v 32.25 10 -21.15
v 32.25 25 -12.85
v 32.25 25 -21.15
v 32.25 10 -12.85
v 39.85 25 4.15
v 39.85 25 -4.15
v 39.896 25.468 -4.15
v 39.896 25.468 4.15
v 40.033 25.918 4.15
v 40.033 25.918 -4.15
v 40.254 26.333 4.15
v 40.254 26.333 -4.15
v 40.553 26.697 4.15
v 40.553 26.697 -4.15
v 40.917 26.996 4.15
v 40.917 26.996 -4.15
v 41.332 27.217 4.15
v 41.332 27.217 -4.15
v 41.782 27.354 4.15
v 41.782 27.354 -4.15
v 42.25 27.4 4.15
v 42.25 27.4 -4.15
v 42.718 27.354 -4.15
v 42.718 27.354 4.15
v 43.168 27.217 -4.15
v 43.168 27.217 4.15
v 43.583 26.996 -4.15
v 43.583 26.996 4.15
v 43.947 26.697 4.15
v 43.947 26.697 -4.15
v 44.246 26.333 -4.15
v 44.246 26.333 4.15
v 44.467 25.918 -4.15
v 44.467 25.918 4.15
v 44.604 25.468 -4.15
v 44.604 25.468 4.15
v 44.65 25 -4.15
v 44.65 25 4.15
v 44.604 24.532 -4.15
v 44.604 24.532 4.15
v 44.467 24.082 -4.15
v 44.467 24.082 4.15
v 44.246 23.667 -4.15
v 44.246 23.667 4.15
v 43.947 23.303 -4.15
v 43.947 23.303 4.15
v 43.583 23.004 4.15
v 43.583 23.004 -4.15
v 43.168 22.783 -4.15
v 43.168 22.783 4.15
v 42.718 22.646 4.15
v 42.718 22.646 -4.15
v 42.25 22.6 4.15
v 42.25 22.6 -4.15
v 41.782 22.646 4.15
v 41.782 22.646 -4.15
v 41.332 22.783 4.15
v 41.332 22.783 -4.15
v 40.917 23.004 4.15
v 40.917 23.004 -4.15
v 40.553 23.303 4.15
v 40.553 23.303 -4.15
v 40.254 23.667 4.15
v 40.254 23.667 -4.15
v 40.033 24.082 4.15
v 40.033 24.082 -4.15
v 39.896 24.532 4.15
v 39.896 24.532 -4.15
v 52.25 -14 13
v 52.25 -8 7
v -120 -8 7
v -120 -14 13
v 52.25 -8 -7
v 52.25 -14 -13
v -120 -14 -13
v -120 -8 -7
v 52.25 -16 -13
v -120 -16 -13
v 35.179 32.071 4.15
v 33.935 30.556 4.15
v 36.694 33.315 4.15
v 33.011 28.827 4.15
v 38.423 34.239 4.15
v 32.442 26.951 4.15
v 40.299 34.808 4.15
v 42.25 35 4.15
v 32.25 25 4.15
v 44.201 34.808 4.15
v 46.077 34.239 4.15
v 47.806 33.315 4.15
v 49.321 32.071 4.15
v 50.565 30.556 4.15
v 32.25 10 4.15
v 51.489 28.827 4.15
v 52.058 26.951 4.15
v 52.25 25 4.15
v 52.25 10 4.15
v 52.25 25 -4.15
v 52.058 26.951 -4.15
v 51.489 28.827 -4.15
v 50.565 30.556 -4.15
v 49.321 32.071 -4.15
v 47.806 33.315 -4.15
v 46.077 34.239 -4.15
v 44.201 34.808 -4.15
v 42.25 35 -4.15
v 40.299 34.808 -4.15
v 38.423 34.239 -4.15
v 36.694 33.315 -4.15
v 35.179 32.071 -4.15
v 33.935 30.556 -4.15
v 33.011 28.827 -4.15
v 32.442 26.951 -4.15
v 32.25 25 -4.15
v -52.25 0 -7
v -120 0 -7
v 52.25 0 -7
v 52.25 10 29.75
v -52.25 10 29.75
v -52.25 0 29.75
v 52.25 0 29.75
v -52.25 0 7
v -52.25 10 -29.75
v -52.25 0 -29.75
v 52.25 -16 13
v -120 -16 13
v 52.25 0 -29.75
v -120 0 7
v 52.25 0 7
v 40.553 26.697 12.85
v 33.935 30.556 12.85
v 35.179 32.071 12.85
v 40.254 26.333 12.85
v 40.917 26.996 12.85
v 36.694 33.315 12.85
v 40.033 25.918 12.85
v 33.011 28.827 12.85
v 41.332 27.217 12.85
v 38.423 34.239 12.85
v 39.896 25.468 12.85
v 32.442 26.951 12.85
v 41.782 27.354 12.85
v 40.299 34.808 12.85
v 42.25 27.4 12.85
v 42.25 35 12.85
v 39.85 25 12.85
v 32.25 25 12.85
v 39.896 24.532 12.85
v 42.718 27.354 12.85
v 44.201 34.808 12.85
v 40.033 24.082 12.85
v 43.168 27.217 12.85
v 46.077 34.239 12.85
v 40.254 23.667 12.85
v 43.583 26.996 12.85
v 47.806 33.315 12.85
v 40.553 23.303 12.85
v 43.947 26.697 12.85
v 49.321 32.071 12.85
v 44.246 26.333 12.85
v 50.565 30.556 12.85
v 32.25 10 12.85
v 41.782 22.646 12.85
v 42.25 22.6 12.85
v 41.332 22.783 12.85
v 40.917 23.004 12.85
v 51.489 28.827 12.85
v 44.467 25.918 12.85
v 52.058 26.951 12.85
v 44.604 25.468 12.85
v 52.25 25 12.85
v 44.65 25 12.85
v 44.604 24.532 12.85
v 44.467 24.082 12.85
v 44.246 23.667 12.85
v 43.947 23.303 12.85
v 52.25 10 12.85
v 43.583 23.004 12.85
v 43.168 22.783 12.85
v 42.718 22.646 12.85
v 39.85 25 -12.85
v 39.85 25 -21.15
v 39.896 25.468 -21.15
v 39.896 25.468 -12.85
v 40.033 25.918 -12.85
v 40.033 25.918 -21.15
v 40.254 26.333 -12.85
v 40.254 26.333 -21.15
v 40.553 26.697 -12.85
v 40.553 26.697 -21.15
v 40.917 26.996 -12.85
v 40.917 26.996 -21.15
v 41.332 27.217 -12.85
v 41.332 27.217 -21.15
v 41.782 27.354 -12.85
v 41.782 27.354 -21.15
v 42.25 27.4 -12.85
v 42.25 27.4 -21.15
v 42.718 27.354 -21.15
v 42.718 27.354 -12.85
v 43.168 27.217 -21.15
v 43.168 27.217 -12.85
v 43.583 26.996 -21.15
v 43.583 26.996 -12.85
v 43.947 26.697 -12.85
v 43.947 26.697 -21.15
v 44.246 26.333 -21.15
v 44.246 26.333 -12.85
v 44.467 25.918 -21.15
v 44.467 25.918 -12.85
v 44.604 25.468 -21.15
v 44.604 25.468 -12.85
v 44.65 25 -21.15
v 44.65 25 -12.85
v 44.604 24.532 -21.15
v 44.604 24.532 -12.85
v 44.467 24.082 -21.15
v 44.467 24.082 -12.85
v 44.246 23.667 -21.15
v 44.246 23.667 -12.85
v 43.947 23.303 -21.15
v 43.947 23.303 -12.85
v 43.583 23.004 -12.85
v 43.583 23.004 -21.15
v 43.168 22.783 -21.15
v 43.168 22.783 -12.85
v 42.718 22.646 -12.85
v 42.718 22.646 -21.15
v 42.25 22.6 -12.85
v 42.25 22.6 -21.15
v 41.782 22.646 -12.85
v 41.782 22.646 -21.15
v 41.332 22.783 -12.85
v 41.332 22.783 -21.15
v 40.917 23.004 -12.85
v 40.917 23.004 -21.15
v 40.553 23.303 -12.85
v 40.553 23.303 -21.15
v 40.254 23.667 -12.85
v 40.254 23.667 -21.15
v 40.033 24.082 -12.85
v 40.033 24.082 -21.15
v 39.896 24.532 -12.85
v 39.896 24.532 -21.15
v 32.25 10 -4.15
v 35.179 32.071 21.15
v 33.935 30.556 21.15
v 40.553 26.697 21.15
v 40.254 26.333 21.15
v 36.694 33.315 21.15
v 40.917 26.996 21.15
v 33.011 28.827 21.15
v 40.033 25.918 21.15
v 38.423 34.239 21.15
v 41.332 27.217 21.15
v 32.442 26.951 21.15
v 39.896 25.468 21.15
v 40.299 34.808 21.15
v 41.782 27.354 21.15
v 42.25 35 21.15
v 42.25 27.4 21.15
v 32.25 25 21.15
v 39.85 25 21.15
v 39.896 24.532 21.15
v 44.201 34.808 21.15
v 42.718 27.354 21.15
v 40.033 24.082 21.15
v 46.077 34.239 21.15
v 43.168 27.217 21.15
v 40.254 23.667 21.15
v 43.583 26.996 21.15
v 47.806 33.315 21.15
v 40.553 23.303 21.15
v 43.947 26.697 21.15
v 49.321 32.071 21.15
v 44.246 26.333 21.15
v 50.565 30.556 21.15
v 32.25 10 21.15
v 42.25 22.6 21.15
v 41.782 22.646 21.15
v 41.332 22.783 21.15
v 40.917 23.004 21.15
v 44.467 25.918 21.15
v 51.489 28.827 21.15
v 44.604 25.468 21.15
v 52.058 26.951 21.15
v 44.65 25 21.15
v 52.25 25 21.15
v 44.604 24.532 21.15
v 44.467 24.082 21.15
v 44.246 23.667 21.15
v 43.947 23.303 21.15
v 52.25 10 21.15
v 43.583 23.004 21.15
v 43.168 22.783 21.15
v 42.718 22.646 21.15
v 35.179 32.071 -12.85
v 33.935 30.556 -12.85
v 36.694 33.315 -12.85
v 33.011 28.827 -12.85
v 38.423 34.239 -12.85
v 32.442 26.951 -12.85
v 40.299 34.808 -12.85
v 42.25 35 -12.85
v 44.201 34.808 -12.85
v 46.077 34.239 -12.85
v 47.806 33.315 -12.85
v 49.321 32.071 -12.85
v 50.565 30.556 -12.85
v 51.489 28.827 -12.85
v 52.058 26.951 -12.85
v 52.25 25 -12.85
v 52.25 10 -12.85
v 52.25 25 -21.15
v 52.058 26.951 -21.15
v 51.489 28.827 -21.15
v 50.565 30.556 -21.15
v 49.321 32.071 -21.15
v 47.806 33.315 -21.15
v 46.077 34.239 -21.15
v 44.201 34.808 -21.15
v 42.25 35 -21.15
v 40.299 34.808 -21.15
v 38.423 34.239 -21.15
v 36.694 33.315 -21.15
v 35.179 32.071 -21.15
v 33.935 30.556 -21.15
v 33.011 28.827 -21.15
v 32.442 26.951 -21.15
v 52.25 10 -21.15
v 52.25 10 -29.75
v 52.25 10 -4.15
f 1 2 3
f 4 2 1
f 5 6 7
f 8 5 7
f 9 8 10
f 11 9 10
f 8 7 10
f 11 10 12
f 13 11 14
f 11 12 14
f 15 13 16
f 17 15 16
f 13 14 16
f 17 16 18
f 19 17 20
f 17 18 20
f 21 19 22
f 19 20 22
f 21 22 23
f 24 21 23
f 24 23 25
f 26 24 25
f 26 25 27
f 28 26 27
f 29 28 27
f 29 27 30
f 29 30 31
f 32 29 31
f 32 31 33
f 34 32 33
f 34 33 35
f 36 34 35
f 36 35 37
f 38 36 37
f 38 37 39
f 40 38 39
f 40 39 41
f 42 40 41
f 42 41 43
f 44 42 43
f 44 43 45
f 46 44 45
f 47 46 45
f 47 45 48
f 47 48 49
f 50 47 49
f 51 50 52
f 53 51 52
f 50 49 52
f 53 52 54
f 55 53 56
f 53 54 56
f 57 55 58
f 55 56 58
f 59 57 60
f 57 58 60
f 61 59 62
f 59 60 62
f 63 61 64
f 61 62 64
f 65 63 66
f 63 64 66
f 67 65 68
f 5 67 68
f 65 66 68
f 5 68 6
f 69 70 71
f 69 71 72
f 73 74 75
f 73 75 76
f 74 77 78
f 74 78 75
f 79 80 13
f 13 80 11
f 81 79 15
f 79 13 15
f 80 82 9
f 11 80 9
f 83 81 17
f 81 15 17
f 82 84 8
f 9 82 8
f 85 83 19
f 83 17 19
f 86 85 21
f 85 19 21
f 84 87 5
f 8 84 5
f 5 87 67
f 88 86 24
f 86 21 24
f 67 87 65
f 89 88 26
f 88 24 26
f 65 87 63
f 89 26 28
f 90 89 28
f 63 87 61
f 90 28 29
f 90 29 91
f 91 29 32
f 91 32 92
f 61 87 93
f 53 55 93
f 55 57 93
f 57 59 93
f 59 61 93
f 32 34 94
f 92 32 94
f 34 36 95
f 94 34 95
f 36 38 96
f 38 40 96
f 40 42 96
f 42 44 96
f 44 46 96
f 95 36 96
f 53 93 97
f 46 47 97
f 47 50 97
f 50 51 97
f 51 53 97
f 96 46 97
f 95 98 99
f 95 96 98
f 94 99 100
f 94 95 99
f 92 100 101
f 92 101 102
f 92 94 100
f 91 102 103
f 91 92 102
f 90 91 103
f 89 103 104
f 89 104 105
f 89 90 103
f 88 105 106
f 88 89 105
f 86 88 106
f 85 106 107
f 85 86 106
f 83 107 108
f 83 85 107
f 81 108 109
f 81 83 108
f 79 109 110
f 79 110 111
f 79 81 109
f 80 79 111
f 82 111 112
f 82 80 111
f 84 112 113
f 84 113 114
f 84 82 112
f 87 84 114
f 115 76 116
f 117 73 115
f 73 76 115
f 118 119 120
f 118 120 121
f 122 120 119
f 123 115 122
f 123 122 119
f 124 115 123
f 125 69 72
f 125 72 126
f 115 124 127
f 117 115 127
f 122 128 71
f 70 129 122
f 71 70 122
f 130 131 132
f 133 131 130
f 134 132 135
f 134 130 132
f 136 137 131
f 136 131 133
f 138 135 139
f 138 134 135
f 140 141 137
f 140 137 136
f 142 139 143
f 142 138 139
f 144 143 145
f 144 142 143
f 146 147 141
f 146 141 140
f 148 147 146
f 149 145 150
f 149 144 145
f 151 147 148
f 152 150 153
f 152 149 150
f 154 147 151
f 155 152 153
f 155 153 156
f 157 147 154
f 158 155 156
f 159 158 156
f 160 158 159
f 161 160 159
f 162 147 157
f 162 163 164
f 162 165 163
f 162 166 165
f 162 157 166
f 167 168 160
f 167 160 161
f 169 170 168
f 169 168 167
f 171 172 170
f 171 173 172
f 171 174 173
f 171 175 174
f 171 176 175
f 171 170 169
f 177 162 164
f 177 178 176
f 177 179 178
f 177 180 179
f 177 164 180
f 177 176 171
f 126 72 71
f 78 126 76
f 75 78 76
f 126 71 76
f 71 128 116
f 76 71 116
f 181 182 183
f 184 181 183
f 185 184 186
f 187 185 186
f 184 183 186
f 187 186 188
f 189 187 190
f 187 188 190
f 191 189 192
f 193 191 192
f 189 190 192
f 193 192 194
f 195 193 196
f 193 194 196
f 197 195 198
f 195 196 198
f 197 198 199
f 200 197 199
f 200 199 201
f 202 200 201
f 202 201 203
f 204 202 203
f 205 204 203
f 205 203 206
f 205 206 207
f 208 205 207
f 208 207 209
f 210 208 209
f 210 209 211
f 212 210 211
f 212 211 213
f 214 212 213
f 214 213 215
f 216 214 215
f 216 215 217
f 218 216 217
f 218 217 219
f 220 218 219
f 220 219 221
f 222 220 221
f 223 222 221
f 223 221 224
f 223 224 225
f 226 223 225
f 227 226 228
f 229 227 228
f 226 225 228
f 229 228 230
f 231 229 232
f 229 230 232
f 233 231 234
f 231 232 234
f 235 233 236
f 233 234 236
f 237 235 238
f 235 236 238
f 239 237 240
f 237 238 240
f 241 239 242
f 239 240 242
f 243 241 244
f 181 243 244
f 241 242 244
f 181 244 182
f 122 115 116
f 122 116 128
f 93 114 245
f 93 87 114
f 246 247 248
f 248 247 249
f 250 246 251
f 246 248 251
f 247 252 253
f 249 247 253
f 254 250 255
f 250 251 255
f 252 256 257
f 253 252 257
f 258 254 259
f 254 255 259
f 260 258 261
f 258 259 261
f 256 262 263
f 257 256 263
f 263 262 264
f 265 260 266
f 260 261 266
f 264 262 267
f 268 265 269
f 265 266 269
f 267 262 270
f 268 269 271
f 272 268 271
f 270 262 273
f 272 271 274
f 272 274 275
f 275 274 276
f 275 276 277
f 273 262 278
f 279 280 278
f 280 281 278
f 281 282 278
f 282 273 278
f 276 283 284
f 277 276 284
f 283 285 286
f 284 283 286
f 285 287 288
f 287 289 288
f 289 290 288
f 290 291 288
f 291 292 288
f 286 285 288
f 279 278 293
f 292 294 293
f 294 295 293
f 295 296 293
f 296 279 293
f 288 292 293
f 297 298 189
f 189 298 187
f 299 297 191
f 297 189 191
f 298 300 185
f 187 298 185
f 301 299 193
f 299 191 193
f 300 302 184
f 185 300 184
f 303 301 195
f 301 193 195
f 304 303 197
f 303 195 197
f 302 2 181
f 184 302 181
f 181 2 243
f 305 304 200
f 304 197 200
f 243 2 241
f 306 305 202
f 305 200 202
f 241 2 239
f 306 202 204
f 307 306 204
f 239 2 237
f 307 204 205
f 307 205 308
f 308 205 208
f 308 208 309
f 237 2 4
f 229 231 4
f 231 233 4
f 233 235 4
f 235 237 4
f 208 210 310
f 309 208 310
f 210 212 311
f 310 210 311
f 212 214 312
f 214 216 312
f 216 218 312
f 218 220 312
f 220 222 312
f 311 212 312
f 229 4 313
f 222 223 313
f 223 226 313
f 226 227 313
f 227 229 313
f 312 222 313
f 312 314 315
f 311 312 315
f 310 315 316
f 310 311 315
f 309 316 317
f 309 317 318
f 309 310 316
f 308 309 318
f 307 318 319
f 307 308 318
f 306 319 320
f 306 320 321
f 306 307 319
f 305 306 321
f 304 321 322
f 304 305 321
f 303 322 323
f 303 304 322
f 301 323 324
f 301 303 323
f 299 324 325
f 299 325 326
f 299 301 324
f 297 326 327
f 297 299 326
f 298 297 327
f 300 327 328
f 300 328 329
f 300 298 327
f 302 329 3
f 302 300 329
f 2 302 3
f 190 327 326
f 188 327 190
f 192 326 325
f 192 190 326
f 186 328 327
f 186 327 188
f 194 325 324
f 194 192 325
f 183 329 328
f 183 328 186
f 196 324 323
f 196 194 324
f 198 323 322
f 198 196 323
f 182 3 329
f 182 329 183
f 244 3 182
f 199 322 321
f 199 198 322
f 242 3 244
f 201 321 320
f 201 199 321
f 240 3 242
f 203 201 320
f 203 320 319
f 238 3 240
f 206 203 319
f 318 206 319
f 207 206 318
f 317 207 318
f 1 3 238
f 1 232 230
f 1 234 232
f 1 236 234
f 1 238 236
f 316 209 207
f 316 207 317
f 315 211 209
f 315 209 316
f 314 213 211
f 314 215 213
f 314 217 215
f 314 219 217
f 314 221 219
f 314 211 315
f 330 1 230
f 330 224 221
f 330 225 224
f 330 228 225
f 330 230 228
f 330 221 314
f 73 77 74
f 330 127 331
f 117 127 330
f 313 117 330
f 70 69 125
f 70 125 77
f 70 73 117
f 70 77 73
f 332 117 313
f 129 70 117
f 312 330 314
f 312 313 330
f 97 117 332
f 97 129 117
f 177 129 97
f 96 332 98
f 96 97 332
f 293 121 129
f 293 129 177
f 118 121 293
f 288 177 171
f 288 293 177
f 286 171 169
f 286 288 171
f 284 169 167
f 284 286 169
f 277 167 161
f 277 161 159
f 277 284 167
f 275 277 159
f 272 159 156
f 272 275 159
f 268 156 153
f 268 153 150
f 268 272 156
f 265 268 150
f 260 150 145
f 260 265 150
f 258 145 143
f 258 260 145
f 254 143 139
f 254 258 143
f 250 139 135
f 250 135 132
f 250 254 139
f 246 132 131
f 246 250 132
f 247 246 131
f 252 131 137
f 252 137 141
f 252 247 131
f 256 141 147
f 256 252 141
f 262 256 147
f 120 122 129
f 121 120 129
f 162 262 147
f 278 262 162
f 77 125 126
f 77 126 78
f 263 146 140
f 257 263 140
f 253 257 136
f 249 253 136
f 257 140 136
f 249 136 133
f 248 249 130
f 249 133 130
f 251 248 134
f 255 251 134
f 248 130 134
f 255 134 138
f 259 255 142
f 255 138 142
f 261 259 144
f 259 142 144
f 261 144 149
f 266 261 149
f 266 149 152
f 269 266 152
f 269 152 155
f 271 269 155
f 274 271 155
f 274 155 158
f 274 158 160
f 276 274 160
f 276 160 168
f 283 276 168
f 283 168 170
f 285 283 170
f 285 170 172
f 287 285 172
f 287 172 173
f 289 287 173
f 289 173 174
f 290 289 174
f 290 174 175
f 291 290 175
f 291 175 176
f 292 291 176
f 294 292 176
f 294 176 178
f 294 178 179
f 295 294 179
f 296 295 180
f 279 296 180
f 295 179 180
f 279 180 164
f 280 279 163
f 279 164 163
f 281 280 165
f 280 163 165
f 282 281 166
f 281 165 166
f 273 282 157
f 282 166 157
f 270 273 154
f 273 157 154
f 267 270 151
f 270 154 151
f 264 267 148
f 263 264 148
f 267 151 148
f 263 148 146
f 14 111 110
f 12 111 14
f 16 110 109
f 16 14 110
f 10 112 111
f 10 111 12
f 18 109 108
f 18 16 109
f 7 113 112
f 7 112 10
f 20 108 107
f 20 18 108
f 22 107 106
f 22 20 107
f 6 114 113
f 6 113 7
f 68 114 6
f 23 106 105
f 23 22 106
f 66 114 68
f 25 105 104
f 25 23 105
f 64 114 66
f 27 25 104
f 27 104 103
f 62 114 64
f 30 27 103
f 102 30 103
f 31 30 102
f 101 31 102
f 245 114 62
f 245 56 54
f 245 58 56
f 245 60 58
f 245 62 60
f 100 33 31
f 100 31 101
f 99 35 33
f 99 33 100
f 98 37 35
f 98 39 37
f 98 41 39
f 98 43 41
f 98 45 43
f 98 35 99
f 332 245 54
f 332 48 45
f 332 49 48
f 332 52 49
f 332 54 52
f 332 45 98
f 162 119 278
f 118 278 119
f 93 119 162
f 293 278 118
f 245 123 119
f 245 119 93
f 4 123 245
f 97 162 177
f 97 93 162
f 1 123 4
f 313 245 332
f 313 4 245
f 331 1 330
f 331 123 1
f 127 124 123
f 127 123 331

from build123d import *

# Parameters (mm, degrees)
SKETCH1_W                       = 104.5
SKETCH1_H                       = 59.5
BOSS_EXTRUDE1_DEPTH             = 10
BOSS_EXTRUDE2_REACH             = 62.952
BOSS_EXTRUDE2_DIRECTION_2_REACH = 62.952
SKETCH4_W                       = 20
SKETCH4_H                       = 8.6
SKETCH4_H_2                     = 8.7
CUT_EXTRUDE1_DEPTH              = 66.116242213
M4_CLEARANCE_HOLE1_D            = 4.8
BOSS_EXTRUDE3_REACH             = 71.571
BOSS_EXTRUDE3_DIRECTION_2_DEPTH = 120


with BuildPart() as part:
    # Sketch1 → Boss-Extrude1 (new body)
    with BuildSketch(Plane(origin=(0, 0, 0), x_dir=(1, 0, 0), z_dir=(0, 1, 0))):
        Rectangle(SKETCH1_W, SKETCH1_H)
    extrude(amount=BOSS_EXTRUDE1_DEPTH)

    # Boss-Extrude2: up to this face of the body (flat: up to its plane)
    boss_extrude2_end = Plane(part.part.faces().sort_by_distance((0, 5, 29.75))[0])
    # Sketch3 → Boss-Extrude2 (add, up to the picked face)
    with BuildSketch(Plane.XY, mode=Mode.PRIVATE) as boss_extrude2_sk1:
        with BuildLine():
            Line((52.25, 10), (52.25, 25))
            ThreePointArc((52.25, 25), (42.25, 35), (32.25, 25))
            Line((32.25, 25), (32.25, 10))
            Line((32.25, 10), (52.25, 10))
        make_face()
    boss_extrude2_tool1 = split(extrude(boss_extrude2_sk1.sketch, amount=BOSS_EXTRUDE2_REACH, mode=Mode.PRIVATE), bisect_by=boss_extrude2_end, keep=Keep.BOTH, mode=Mode.PRIVATE)
    add(boss_extrude2_tool1.solids().sort_by(Axis((42.25, 21.535979, 0), (0, 0, 1)))[0])

    # Boss-Extrude2 direction 2: up to this face of the body (flat: up to its plane)
    boss_extrude2_direction_2_end = Plane(part.part.faces().sort_by_distance((0, 5, -29.75))[0])
    # Sketch3 → Boss-Extrude2 direction 2 (add, up to the picked face)
    with BuildSketch(Plane.XY, mode=Mode.PRIVATE) as boss_extrude2_direction_2_sk1:
        with BuildLine():
            Line((52.25, 10), (52.25, 25))
            ThreePointArc((52.25, 25), (42.25, 35), (32.25, 25))
            Line((32.25, 25), (32.25, 10))
            Line((32.25, 10), (52.25, 10))
        make_face()
    boss_extrude2_direction_2_tool1 = split(extrude(boss_extrude2_direction_2_sk1.sketch, amount=-BOSS_EXTRUDE2_DIRECTION_2_REACH, mode=Mode.PRIVATE), bisect_by=boss_extrude2_direction_2_end, keep=Keep.BOTH, mode=Mode.PRIVATE)
    add(boss_extrude2_direction_2_tool1.solids().sort_by(Axis((42.25, 21.535979, 0), (0, 0, -1)))[0])

    # Sketch4 → Cut-Extrude1 (cut, through all)
    with BuildSketch(Plane(origin=(0, 10, 0), x_dir=(1, 0, 0), z_dir=(0, 1, 0))):
        with Locations((42.25, 25.45)):
            Rectangle(SKETCH4_W, SKETCH4_H)
        with Locations((42.25, 8.5)):
            Rectangle(SKETCH4_W, SKETCH4_H_2)
        with Locations((42.25, -8.5)):
            Rectangle(SKETCH4_W, SKETCH4_H_2)
        with Locations((42.25, -25.45)):
            Rectangle(SKETCH4_W, SKETCH4_H)
    extrude(amount=CUT_EXTRUDE1_DEPTH, mode=Mode.SUBTRACT)

    # M4 Clearance Hole1 (through all)
    with Locations(Plane.XY.offset(29.75)):
        with Locations((42.25, 25)):
            Hole(M4_CLEARANCE_HOLE1_D / 2)

    # Boss-Extrude3: up to this face of the body (flat: up to its plane)
    boss_extrude3_end = Plane(part.part.faces().sort_by_distance((52.25, 9.820598864, 0))[0])
    # Sketch8 → Boss-Extrude3 (add, up to the picked face)
    with BuildSketch(Plane(origin=(0, 0, 0), x_dir=(0, 0, -1), z_dir=(1, 0, 0)), mode=Mode.PRIVATE) as boss_extrude3_sk1:
        Polygon((-7, 0), (-7, -8), (-13, -14), (-13, -16), (13, -16), (13, -14), (7, -8), (7, 0), align=None)
    boss_extrude3_tool1 = split(extrude(boss_extrude3_sk1.sketch, amount=BOSS_EXTRUDE3_REACH, mode=Mode.PRIVATE), bisect_by=boss_extrude3_end, keep=Keep.BOTH, mode=Mode.PRIVATE)
    add(boss_extrude3_tool1.solids().sort_by(Axis((0, -9.098592, 0), (1, 0, 0)))[0])

    # Sketch8 → Boss-Extrude3 direction 2 (add)
    with BuildSketch(Plane(origin=(0, 0, 0), x_dir=(0, 0, -1), z_dir=(1, 0, 0))):
        Polygon((-7, 0), (-7, -8), (-13, -14), (-13, -16), (13, -16), (13, -14), (7, -8), (7, 0), align=None)
    extrude(amount=-BOSS_EXTRUDE3_DIRECTION_2_DEPTH)


solid = part.part
